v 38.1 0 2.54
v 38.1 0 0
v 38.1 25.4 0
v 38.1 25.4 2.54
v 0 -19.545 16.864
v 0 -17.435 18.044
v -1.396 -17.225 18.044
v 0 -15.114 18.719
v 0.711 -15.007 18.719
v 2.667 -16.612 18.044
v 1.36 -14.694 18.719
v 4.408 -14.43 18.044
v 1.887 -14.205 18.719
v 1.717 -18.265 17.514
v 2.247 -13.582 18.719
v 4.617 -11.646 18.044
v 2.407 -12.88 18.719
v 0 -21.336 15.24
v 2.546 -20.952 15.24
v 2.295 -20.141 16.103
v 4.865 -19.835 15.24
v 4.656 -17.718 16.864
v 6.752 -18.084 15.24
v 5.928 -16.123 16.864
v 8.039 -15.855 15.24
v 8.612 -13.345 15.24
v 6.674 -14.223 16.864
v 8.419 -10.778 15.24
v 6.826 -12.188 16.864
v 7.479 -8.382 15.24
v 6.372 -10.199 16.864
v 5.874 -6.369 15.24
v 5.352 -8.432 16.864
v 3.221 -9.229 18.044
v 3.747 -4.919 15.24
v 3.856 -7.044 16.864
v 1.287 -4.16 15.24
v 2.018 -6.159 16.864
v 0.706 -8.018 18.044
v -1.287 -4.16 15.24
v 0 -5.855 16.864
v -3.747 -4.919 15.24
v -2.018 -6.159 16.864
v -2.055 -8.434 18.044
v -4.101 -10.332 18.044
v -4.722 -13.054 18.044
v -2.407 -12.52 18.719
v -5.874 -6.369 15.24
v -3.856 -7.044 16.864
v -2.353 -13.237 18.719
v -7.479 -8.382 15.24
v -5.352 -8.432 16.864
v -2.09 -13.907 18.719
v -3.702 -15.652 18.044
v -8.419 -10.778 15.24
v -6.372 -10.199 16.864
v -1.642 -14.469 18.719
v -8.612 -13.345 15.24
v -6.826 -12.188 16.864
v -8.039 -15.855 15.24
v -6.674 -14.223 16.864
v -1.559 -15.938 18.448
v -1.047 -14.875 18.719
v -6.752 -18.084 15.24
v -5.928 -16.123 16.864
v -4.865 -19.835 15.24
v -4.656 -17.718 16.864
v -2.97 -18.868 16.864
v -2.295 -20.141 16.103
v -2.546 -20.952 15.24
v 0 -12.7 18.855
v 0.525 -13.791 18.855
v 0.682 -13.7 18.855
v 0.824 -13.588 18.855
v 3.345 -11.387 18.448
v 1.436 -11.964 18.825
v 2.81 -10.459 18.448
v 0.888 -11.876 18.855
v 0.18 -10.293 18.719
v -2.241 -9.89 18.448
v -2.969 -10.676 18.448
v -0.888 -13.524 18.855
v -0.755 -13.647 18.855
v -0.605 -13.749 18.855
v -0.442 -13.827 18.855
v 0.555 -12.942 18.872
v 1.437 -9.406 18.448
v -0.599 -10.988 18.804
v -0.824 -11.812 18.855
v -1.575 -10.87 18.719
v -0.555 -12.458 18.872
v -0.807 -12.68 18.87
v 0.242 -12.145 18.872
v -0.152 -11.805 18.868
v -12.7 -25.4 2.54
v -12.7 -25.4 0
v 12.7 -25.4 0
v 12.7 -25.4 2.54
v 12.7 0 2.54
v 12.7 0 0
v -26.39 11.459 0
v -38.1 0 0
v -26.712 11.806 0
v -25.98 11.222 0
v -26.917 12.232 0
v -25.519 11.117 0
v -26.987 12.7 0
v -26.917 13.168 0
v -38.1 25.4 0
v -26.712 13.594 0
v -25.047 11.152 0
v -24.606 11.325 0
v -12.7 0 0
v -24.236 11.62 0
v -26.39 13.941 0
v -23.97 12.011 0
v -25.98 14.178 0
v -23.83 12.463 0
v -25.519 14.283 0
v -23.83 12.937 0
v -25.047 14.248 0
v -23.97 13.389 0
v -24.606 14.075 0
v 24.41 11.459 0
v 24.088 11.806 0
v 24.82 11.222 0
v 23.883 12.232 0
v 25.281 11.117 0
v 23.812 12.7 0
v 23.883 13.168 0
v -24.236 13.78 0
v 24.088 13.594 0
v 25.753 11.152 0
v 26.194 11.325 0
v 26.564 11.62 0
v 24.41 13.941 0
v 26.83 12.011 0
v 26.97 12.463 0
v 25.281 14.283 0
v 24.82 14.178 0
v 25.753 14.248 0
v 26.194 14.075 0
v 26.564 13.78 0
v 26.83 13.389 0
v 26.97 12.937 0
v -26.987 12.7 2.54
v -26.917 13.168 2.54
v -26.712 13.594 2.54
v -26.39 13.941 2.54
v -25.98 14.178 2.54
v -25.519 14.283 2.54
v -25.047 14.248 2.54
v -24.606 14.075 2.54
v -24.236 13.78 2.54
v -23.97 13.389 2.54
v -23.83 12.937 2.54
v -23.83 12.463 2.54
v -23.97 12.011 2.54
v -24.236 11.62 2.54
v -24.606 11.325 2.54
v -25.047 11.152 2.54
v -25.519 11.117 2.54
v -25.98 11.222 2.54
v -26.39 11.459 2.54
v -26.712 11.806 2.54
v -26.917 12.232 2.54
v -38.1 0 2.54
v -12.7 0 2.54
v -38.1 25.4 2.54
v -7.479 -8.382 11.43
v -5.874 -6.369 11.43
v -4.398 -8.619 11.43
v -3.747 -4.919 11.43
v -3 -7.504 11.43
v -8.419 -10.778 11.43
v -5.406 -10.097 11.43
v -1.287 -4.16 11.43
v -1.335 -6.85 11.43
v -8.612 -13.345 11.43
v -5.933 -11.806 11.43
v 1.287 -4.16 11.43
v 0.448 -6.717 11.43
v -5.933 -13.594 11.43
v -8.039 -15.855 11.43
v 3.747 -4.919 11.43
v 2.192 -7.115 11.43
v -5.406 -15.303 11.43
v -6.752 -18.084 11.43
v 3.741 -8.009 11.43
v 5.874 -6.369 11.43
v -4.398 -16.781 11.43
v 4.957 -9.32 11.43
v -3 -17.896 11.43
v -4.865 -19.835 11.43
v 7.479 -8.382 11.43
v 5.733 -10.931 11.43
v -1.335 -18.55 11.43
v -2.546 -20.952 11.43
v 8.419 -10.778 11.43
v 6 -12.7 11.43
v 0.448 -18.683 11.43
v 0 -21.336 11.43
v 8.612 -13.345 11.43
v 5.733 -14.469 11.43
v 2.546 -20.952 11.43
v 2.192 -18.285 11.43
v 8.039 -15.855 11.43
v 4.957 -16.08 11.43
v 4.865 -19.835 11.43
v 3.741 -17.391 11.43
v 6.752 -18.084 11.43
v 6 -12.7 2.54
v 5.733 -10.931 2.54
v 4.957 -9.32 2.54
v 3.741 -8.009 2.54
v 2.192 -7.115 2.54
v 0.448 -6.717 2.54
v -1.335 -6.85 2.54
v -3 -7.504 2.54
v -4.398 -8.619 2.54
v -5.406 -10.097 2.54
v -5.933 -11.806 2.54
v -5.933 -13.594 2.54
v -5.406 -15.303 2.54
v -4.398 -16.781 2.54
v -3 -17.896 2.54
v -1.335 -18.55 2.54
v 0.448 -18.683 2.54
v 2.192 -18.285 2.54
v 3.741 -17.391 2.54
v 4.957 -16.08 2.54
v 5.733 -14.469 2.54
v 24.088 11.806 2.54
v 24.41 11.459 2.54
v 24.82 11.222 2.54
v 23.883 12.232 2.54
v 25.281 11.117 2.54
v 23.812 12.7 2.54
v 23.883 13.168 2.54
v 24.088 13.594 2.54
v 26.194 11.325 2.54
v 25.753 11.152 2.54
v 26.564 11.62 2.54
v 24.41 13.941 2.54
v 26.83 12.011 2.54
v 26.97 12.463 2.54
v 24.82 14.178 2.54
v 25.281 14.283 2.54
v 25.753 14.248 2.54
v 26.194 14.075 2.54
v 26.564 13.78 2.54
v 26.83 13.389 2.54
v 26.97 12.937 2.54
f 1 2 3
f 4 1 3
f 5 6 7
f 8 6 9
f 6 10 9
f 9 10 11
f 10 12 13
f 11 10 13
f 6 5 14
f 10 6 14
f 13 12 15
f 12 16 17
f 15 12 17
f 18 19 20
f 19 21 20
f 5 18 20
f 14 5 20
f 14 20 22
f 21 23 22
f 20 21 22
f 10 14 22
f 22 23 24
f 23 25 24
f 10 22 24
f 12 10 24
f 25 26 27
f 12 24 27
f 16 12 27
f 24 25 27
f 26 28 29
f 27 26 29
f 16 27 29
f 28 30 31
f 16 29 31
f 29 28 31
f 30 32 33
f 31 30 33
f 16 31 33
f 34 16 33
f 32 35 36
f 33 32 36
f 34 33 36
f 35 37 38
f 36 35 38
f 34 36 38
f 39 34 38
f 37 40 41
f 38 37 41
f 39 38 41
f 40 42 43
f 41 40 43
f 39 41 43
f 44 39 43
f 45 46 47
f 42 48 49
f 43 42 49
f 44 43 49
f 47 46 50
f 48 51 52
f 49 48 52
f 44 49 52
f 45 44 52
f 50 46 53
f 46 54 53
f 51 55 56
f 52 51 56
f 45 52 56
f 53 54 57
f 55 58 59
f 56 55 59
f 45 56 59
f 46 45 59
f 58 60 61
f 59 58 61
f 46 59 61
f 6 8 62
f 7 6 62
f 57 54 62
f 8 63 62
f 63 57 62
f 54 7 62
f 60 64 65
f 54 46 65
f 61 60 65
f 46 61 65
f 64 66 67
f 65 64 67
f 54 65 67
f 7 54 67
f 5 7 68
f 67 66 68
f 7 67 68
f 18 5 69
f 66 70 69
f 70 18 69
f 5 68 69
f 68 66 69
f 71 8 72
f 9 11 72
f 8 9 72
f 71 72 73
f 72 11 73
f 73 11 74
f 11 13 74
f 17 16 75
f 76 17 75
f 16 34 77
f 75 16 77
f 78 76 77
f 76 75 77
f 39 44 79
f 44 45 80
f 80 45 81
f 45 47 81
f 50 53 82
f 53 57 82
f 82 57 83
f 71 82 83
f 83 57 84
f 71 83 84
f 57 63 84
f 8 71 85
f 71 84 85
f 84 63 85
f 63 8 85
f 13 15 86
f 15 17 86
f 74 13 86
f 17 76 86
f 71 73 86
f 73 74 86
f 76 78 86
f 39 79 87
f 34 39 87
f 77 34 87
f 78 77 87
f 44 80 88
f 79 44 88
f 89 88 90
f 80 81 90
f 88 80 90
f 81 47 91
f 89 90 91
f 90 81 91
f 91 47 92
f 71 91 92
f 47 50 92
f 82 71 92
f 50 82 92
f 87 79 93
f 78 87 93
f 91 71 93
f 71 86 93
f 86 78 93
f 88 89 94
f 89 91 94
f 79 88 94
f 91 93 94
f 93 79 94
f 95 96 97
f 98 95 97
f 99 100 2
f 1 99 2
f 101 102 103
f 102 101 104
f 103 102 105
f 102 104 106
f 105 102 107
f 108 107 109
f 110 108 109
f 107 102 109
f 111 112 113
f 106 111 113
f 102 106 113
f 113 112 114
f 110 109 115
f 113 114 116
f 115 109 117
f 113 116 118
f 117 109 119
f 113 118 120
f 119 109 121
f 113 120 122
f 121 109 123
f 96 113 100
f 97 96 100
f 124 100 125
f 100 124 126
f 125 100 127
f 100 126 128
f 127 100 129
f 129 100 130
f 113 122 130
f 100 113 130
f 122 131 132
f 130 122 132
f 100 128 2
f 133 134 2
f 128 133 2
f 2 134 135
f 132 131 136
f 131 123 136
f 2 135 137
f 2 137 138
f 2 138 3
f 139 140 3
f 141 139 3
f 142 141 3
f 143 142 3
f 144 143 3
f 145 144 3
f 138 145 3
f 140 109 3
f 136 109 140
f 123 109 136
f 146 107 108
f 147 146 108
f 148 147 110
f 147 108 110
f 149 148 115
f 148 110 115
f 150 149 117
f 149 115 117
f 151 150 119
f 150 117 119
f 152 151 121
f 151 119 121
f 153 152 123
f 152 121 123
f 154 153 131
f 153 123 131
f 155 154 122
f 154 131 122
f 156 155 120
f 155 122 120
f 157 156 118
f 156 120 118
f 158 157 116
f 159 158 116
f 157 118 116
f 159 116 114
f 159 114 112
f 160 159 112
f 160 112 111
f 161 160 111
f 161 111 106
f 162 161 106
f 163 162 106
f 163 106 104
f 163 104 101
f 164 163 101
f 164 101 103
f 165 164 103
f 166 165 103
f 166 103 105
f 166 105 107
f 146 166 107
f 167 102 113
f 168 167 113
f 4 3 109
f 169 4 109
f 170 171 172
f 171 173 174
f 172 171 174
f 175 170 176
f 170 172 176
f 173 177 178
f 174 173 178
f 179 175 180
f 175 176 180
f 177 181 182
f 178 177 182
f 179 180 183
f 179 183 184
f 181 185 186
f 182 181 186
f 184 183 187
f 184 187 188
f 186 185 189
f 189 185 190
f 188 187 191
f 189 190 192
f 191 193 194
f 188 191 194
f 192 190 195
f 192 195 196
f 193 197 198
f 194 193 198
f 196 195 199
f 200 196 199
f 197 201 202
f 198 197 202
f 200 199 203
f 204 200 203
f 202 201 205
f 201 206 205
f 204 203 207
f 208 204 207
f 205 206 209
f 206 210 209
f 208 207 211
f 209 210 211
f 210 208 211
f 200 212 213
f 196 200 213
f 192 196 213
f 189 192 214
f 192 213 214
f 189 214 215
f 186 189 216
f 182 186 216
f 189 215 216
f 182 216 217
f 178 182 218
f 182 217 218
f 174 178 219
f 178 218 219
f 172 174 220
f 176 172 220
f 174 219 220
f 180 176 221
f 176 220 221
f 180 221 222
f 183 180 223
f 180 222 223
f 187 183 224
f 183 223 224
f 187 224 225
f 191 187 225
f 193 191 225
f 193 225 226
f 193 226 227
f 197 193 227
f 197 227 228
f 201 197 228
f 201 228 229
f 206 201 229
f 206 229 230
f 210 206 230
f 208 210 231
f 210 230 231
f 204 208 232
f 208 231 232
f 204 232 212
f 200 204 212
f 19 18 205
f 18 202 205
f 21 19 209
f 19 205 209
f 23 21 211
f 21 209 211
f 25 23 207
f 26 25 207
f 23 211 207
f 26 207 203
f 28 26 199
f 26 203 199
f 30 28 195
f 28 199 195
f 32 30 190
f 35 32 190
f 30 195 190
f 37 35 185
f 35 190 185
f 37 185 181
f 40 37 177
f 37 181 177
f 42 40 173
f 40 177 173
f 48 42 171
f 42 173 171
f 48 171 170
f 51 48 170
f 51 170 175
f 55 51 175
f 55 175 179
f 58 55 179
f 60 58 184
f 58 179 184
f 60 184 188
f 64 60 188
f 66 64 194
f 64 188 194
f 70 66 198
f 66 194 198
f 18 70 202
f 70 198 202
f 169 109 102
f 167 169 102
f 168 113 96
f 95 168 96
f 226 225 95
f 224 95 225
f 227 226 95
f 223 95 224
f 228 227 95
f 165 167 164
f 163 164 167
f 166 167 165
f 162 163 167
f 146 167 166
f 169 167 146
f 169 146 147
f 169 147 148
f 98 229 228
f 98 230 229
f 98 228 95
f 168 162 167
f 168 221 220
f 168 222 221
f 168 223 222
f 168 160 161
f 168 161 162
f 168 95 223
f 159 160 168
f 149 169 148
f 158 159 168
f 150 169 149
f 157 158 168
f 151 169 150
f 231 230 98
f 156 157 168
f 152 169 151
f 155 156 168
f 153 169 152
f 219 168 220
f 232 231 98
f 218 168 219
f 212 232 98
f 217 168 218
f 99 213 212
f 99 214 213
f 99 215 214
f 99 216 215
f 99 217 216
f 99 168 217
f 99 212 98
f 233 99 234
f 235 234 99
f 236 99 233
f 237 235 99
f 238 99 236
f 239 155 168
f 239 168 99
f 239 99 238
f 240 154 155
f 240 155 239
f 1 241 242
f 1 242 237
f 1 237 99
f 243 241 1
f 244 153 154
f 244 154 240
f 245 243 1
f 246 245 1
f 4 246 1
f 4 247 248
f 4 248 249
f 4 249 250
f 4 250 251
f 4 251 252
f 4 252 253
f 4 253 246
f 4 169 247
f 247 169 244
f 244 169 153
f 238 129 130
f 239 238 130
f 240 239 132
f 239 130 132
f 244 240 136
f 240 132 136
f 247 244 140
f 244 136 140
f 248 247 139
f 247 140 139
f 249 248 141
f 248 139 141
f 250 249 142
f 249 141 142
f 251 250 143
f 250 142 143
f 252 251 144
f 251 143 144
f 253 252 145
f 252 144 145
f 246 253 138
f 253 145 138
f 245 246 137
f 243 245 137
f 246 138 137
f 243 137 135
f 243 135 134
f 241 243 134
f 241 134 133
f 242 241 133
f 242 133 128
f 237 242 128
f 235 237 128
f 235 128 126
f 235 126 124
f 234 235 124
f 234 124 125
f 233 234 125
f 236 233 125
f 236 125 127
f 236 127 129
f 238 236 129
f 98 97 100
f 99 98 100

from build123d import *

# Parameters (mm, degrees)
BOSS_EXTRUDE1_DEPTH = 2.54
SKETCH2_R           = 6
BOSS_EXTRUDE2_DEPTH = 8.89
CUT_EXTRUDE1_REACH  = 20.872
SKETCH5_R           = 1.5875


with BuildPart() as part:
    # Sketch1 → Boss-Extrude1 (new body)
    with BuildSketch(Plane.XY):
        Polygon((12.7, 0), (38.1, 0), (38.1, 25.4), (-38.1, 25.4), (-38.1, 0), (-12.7, 0), (-12.7, -25.4), (12.7, -25.4), align=None)
    extrude(amount=BOSS_EXTRUDE1_DEPTH)

    # Sketch2 → Boss-Extrude2 (add)
    with BuildSketch(Plane.XY.offset(2.54)):
        with Locations((0, -12.7)):
            Circle(SKETCH2_R)
    extrude(amount=BOSS_EXTRUDE2_DEPTH)

    # Sketch4 → Revolve1 (revolve)
    with BuildSketch(Plane(origin=(0, 0, 0), x_dir=(0, 0, -1), z_dir=(1, 0, 0))):
        with BuildLine():
            Line((-11.43, -12.7), (-18.854523239, -12.7))
            ThreePointArc((-18.854523239, -12.7), (-18.044308382, -17.435305314), (-15.24, -21.336))
            Line((-15.24, -21.336), (-11.43, -21.336))
            Line((-11.43, -21.336), (-11.43, -12.7))
        make_face()
    revolve(axis=Axis((0, -12.7, 11.43), (0, 0, 1)))

    # Sketch5 → Cut-Extrude1 (cut, up to next)
    with BuildSketch(Plane(origin=(0, 0, 0), x_dir=(-1, 0, 0), z_dir=(0, 0, -1)), mode=Mode.PRIVATE) as cut_extrude1_sk1:
        with Locations((25.4, 12.7)):
            Circle(SKETCH5_R)
    cut_extrude1_tool1 = extrude(cut_extrude1_sk1.sketch, amount=-CUT_EXTRUDE1_REACH, mode=Mode.PRIVATE) & part.part
    add(cut_extrude1_tool1.solids().sort_by_distance((-25.4, 12.7, 0))[0], mode=Mode.SUBTRACT)
    # Sketch5 → Cut-Extrude1 (cut, up to next)
    with BuildSketch(Plane(origin=(0, 0, 0), x_dir=(-1, 0, 0), z_dir=(0, 0, -1)), mode=Mode.PRIVATE) as cut_extrude1_sk2:
        with Locations((-25.4, 12.7)):
            Circle(SKETCH5_R)
    cut_extrude1_tool2 = extrude(cut_extrude1_sk2.sketch, amount=-CUT_EXTRUDE1_REACH, mode=Mode.PRIVATE) & part.part
    add(cut_extrude1_tool2.solids().sort_by_distance((25.4, 12.7, 0))[0], mode=Mode.SUBTRACT)


solid = part.part
